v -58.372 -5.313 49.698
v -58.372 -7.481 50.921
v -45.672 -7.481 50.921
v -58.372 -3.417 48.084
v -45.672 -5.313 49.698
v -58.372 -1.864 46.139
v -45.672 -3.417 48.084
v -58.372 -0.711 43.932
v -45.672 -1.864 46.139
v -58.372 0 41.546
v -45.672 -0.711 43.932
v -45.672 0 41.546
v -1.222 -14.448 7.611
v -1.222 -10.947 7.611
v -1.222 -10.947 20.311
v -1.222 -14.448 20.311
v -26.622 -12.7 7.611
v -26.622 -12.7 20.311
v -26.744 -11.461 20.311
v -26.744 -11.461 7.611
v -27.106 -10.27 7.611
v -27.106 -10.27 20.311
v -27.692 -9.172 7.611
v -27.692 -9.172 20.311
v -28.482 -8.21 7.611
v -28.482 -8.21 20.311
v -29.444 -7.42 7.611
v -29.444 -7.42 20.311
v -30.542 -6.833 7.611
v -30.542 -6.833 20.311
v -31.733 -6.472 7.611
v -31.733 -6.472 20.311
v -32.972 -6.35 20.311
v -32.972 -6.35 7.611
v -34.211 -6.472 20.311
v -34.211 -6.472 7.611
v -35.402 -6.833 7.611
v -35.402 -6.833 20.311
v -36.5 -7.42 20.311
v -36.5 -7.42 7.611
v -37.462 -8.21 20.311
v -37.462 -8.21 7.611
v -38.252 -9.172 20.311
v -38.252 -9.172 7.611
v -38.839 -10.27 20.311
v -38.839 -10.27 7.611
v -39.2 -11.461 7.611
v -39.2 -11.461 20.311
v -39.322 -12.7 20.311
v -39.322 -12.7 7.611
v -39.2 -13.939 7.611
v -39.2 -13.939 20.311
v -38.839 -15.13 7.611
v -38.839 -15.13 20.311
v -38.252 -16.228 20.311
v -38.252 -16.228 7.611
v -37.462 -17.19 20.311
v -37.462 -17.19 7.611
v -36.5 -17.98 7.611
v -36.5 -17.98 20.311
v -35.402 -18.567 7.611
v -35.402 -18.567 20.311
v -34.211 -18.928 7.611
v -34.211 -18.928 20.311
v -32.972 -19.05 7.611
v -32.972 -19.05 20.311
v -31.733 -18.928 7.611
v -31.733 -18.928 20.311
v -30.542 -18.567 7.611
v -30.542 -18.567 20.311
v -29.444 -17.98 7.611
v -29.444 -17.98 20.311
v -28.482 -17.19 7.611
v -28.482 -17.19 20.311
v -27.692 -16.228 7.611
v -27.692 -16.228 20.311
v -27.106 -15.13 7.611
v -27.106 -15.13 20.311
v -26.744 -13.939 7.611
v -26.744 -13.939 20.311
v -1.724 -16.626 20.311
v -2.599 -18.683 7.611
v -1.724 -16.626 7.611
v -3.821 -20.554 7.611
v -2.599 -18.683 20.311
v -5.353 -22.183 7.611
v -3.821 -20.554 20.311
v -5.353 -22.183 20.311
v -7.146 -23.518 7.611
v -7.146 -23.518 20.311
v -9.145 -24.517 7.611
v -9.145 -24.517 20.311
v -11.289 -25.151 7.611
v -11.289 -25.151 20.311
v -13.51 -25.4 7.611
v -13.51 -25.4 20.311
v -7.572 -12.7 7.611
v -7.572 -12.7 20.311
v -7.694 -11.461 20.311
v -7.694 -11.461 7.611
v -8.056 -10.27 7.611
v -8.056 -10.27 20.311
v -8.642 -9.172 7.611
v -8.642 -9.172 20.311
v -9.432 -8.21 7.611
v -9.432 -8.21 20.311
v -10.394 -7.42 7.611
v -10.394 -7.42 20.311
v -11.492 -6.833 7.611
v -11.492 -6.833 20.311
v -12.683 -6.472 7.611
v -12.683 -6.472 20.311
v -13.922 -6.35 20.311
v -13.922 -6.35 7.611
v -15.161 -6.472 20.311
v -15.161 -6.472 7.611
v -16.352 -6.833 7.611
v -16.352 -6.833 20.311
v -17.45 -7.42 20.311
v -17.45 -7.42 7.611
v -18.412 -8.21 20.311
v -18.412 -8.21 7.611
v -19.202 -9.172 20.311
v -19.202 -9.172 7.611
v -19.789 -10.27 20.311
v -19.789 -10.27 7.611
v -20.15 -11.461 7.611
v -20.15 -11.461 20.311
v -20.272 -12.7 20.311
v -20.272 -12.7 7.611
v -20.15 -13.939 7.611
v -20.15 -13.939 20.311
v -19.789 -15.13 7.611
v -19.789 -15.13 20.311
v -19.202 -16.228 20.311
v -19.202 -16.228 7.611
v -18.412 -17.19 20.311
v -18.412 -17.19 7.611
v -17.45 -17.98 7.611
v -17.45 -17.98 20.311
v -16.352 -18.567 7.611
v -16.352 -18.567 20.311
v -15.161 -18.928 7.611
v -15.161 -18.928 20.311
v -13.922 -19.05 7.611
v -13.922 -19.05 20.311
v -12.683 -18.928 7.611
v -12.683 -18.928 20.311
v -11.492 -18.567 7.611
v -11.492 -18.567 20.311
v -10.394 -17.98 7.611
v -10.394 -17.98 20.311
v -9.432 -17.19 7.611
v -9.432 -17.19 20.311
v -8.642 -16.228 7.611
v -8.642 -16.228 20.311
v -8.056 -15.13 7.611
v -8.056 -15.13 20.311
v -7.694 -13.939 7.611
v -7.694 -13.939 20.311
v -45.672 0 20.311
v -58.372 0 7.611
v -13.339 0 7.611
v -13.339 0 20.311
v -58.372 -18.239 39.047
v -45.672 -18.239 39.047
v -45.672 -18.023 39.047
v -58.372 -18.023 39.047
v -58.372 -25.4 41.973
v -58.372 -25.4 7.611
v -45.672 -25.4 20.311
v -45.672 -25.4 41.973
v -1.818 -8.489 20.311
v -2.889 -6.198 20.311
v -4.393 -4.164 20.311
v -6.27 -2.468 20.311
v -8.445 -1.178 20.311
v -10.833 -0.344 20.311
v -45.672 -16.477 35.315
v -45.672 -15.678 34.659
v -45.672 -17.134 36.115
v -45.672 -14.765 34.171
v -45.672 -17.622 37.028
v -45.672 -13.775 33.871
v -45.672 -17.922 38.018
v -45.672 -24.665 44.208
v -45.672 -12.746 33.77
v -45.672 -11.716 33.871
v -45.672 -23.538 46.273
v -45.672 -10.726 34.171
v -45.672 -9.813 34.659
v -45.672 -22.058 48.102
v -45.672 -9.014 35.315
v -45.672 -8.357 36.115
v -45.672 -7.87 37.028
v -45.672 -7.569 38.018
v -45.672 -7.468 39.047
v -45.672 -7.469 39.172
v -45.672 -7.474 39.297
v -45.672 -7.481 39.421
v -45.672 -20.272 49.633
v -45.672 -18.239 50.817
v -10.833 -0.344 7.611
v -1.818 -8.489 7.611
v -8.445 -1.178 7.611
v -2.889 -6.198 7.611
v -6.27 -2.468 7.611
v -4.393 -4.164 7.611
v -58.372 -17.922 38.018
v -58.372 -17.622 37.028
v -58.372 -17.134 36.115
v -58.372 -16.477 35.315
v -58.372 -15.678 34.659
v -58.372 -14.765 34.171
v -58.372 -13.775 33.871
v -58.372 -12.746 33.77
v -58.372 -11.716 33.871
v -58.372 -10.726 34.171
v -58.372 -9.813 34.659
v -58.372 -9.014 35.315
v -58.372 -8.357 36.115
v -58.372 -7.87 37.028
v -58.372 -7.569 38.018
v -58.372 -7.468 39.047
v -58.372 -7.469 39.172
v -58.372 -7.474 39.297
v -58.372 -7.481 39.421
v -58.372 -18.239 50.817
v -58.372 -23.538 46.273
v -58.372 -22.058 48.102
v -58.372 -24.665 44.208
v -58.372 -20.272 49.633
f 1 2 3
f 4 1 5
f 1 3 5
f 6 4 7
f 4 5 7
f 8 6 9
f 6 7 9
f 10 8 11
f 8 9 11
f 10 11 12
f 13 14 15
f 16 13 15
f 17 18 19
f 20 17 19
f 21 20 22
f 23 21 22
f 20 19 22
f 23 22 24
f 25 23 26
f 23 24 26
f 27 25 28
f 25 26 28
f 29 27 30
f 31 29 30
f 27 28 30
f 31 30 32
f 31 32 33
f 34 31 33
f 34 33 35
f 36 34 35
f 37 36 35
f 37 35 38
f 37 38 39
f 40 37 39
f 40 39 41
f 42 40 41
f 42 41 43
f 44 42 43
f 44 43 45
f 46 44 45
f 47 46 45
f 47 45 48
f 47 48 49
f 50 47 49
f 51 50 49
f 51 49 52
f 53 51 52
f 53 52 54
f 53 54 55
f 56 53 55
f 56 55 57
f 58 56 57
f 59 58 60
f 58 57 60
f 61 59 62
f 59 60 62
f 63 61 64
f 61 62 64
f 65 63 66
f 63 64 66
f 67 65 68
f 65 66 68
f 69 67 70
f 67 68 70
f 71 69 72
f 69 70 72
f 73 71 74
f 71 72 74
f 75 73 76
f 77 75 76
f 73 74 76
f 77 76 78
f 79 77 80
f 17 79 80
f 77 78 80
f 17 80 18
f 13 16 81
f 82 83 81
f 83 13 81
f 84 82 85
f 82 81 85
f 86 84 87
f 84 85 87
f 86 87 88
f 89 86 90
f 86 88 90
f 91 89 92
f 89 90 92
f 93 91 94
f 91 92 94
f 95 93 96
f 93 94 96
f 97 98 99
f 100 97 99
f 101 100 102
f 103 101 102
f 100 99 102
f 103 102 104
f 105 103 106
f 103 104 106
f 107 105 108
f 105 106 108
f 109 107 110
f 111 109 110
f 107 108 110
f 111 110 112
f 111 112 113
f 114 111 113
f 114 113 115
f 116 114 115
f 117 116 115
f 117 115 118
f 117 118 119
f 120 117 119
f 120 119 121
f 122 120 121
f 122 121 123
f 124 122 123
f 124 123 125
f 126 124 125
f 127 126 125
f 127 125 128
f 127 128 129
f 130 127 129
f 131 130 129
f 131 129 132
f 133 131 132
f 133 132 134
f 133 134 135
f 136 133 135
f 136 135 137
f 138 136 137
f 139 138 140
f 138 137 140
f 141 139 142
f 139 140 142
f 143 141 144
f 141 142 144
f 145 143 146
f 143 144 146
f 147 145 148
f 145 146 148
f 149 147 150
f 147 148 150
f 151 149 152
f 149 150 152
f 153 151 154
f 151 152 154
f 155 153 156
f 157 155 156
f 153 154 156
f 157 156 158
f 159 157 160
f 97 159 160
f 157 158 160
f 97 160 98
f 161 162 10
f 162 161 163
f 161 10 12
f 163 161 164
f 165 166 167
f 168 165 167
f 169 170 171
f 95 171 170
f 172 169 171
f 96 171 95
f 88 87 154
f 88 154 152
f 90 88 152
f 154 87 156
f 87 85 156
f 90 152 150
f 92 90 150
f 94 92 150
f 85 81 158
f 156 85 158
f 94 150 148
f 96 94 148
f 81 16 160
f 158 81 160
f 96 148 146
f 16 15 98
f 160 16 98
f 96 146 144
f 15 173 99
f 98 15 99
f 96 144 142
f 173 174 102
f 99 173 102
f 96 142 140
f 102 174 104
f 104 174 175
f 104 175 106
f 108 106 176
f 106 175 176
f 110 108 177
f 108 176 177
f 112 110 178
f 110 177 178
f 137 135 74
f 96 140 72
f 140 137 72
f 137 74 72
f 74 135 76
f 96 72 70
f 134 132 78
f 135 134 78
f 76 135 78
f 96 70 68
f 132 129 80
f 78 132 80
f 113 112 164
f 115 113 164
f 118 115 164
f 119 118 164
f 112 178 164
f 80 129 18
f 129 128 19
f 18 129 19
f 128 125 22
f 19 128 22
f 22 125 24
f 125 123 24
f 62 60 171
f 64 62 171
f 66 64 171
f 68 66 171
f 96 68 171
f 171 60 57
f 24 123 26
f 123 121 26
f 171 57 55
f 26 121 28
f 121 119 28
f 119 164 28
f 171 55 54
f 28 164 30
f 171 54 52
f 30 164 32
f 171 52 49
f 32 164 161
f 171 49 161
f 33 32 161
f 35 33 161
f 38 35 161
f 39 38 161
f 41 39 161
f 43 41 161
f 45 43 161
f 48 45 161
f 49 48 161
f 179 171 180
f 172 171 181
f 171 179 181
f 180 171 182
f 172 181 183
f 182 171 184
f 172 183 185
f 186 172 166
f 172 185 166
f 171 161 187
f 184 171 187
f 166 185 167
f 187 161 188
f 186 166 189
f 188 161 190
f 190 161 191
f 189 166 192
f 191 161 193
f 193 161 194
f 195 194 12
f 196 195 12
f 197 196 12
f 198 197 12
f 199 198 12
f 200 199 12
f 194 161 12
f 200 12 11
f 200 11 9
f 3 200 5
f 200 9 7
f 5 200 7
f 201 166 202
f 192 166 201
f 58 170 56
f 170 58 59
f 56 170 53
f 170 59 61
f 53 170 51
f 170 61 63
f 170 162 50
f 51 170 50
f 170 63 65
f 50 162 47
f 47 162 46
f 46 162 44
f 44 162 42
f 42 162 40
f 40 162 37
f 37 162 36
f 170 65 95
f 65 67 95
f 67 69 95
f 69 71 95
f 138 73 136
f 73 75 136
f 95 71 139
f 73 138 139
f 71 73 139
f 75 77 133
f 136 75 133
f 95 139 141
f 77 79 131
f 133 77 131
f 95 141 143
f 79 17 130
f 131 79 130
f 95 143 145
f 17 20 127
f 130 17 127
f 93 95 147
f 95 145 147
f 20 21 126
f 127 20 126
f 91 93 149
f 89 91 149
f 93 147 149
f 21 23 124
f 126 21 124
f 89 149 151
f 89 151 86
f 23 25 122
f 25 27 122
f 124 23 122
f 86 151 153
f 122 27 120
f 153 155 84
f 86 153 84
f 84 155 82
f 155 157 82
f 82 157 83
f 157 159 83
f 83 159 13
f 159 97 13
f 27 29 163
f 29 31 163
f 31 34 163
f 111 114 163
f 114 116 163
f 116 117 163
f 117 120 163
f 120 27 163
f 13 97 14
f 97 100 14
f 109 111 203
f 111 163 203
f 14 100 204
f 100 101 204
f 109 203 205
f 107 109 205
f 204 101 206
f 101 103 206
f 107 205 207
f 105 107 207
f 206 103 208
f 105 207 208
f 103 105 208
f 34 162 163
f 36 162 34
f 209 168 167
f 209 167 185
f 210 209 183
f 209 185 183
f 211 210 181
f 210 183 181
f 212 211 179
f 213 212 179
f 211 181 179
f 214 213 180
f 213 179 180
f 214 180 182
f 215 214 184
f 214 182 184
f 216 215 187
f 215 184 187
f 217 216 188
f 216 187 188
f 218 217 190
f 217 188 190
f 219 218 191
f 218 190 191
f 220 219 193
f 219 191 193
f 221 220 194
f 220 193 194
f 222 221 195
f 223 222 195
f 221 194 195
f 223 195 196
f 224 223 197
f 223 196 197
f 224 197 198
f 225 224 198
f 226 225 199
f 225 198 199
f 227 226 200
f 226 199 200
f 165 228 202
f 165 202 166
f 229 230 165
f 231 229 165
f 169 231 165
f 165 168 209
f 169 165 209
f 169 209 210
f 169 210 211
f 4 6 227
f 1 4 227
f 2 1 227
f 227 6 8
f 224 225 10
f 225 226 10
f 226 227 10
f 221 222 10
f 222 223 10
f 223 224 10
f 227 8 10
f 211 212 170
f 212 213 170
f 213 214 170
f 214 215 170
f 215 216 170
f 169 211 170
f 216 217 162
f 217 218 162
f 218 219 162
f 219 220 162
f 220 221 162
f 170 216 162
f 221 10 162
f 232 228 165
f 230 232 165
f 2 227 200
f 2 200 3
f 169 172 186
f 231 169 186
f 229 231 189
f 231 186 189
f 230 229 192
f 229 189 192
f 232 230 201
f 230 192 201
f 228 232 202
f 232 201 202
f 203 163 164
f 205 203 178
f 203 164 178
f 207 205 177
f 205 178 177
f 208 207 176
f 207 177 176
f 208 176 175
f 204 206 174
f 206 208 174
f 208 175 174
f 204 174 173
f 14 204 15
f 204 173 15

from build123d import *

# Parameters (mm, degrees)
F1_DEPTH = 25.4
F2_R     = 6.35
F3_DEPTH = 12.701
F5_DEPTH = 12.701
F7_DEPTH = 12.701


with BuildPart() as f1:
    # F0 (on Front) → F1 (new body)
    with BuildSketch(Plane.XZ):
        Polygon((-45.6721438388, 52.0613446782), (-58.3721438388, 52.0613446782), (-58.3721438388, 7.6113446782), (-1.2221438388, 7.6113446782), (-1.2221438388, 20.3113446782), (-45.6721438388, 20.3113446782), align=None)
    extrude(amount=F1_DEPTH)

    # F2 (on face) → F3 (cut, through all)
    with BuildSketch(Plane.XY.offset(20.3113446782)):
        with Locations((-32.9721438388, -12.7)):
            Circle(F2_R)
        with Locations((-13.9221438388, -12.7)):
            Circle(F2_R)
    extrude(amount=-F3_DEPTH, mode=Mode.SUBTRACT)

    # F4 (on face) → F5 (cut, through all)
    with BuildSketch(Plane.XY.offset(20.3113446782)):
        with BuildLine():
            ThreePointArc((-13.3388349786, 0), (-5.2890481293, -3.2694333282), (-1.2221438388, -10.9472293725))
            Line((-1.2221438388, -10.9472293725), (-1.2221438388, 0))
            Line((-1.2221438388, 0), (-13.3388349786, 0))
        make_face()
        with BuildLine():
            ThreePointArc((-1.2221438388, -14.447602267), (-5.3529503077, -22.1827419169), (-13.5104743141, -25.4))
            Line((-13.5104743141, -25.4), (-1.2221438388, -25.4))
            Line((-1.2221438388, -25.4), (-1.2221438388, -14.447602267))
        make_face()
    extrude(amount=-F5_DEPTH, mode=Mode.SUBTRACT)

    # F6 (on face) → F7 (cut, through all)
    with BuildSketch(Plane.YZ.offset(-45.6721438388)):
        with BuildLine():
            Line((-7.4811726809, 39.4210381167), (-7.4811726809, 50.9207851655))
            ThreePointArc((-7.4811726809, 50.9207851655), (-12.8712353004, 52.0348936879), (-18.2387330395, 50.8167061557))
            Line((-18.2387330395, 50.8167061557), (-18.2387330395, 39.0471868407))
            Line((-18.2387330395, 39.0471868407), (-18.0232445354, 39.0471868407))
            ThreePointArc((-18.0232445354, 39.0471868407), (-12.9326228444, 44.3215361788), (-7.4811726809, 39.4210381167))
        make_face()
        with BuildLine():
            ThreePointArc((-7.4811726809, 50.9207851655), (-2.5937691395, 47.1488570851), (0, 41.5464900434))
            Line((0, 41.5464900434), (0, 52.0613446782))
            Line((0, 52.0613446782), (-25.4, 52.0613446782))
            Line((-25.4, 52.0613446782), (-25.4, 41.9732704759))
            ThreePointArc((-25.4, 41.9732704759), (-22.839399389, 47.2209939486), (-18.2387330395, 50.8167061557))
            ThreePointArc((-18.2387330395, 50.8167061557), (-12.8712353004, 52.0348936879), (-7.4811726809, 50.9207851655))
        make_face()
        with BuildLine():
            Line((-7.4811726809, 39.0471868407), (-7.4811726809, 39.4210381167))
            ThreePointArc((-7.4811726809, 39.4210381167), (-12.9326228444, 44.3215361788), (-18.0232445354, 39.0471868407))
            Line((-18.0232445354, 39.0471868407), (-7.4811726809, 39.0471868407))
        make_face()
        with BuildLine():
            ThreePointArc((-7.4679148717, 39.0471868407), (-7.4712303654, 39.2342299815), (-7.4811726809, 39.4210381167))
            Line((-7.4811726809, 39.4210381167), (-7.4811726809, 39.0471868407))
            Line((-7.4811726809, 39.0471868407), (-18.0232445354, 39.0471868407))
            ThreePointArc((-18.0232445354, 39.0471868407), (-12.7455797036, 33.7695220088), (-7.4679148717, 39.0471868407))
        make_face()
    extrude(amount=-F7_DEPTH, mode=Mode.SUBTRACT)


solid = f1.part
